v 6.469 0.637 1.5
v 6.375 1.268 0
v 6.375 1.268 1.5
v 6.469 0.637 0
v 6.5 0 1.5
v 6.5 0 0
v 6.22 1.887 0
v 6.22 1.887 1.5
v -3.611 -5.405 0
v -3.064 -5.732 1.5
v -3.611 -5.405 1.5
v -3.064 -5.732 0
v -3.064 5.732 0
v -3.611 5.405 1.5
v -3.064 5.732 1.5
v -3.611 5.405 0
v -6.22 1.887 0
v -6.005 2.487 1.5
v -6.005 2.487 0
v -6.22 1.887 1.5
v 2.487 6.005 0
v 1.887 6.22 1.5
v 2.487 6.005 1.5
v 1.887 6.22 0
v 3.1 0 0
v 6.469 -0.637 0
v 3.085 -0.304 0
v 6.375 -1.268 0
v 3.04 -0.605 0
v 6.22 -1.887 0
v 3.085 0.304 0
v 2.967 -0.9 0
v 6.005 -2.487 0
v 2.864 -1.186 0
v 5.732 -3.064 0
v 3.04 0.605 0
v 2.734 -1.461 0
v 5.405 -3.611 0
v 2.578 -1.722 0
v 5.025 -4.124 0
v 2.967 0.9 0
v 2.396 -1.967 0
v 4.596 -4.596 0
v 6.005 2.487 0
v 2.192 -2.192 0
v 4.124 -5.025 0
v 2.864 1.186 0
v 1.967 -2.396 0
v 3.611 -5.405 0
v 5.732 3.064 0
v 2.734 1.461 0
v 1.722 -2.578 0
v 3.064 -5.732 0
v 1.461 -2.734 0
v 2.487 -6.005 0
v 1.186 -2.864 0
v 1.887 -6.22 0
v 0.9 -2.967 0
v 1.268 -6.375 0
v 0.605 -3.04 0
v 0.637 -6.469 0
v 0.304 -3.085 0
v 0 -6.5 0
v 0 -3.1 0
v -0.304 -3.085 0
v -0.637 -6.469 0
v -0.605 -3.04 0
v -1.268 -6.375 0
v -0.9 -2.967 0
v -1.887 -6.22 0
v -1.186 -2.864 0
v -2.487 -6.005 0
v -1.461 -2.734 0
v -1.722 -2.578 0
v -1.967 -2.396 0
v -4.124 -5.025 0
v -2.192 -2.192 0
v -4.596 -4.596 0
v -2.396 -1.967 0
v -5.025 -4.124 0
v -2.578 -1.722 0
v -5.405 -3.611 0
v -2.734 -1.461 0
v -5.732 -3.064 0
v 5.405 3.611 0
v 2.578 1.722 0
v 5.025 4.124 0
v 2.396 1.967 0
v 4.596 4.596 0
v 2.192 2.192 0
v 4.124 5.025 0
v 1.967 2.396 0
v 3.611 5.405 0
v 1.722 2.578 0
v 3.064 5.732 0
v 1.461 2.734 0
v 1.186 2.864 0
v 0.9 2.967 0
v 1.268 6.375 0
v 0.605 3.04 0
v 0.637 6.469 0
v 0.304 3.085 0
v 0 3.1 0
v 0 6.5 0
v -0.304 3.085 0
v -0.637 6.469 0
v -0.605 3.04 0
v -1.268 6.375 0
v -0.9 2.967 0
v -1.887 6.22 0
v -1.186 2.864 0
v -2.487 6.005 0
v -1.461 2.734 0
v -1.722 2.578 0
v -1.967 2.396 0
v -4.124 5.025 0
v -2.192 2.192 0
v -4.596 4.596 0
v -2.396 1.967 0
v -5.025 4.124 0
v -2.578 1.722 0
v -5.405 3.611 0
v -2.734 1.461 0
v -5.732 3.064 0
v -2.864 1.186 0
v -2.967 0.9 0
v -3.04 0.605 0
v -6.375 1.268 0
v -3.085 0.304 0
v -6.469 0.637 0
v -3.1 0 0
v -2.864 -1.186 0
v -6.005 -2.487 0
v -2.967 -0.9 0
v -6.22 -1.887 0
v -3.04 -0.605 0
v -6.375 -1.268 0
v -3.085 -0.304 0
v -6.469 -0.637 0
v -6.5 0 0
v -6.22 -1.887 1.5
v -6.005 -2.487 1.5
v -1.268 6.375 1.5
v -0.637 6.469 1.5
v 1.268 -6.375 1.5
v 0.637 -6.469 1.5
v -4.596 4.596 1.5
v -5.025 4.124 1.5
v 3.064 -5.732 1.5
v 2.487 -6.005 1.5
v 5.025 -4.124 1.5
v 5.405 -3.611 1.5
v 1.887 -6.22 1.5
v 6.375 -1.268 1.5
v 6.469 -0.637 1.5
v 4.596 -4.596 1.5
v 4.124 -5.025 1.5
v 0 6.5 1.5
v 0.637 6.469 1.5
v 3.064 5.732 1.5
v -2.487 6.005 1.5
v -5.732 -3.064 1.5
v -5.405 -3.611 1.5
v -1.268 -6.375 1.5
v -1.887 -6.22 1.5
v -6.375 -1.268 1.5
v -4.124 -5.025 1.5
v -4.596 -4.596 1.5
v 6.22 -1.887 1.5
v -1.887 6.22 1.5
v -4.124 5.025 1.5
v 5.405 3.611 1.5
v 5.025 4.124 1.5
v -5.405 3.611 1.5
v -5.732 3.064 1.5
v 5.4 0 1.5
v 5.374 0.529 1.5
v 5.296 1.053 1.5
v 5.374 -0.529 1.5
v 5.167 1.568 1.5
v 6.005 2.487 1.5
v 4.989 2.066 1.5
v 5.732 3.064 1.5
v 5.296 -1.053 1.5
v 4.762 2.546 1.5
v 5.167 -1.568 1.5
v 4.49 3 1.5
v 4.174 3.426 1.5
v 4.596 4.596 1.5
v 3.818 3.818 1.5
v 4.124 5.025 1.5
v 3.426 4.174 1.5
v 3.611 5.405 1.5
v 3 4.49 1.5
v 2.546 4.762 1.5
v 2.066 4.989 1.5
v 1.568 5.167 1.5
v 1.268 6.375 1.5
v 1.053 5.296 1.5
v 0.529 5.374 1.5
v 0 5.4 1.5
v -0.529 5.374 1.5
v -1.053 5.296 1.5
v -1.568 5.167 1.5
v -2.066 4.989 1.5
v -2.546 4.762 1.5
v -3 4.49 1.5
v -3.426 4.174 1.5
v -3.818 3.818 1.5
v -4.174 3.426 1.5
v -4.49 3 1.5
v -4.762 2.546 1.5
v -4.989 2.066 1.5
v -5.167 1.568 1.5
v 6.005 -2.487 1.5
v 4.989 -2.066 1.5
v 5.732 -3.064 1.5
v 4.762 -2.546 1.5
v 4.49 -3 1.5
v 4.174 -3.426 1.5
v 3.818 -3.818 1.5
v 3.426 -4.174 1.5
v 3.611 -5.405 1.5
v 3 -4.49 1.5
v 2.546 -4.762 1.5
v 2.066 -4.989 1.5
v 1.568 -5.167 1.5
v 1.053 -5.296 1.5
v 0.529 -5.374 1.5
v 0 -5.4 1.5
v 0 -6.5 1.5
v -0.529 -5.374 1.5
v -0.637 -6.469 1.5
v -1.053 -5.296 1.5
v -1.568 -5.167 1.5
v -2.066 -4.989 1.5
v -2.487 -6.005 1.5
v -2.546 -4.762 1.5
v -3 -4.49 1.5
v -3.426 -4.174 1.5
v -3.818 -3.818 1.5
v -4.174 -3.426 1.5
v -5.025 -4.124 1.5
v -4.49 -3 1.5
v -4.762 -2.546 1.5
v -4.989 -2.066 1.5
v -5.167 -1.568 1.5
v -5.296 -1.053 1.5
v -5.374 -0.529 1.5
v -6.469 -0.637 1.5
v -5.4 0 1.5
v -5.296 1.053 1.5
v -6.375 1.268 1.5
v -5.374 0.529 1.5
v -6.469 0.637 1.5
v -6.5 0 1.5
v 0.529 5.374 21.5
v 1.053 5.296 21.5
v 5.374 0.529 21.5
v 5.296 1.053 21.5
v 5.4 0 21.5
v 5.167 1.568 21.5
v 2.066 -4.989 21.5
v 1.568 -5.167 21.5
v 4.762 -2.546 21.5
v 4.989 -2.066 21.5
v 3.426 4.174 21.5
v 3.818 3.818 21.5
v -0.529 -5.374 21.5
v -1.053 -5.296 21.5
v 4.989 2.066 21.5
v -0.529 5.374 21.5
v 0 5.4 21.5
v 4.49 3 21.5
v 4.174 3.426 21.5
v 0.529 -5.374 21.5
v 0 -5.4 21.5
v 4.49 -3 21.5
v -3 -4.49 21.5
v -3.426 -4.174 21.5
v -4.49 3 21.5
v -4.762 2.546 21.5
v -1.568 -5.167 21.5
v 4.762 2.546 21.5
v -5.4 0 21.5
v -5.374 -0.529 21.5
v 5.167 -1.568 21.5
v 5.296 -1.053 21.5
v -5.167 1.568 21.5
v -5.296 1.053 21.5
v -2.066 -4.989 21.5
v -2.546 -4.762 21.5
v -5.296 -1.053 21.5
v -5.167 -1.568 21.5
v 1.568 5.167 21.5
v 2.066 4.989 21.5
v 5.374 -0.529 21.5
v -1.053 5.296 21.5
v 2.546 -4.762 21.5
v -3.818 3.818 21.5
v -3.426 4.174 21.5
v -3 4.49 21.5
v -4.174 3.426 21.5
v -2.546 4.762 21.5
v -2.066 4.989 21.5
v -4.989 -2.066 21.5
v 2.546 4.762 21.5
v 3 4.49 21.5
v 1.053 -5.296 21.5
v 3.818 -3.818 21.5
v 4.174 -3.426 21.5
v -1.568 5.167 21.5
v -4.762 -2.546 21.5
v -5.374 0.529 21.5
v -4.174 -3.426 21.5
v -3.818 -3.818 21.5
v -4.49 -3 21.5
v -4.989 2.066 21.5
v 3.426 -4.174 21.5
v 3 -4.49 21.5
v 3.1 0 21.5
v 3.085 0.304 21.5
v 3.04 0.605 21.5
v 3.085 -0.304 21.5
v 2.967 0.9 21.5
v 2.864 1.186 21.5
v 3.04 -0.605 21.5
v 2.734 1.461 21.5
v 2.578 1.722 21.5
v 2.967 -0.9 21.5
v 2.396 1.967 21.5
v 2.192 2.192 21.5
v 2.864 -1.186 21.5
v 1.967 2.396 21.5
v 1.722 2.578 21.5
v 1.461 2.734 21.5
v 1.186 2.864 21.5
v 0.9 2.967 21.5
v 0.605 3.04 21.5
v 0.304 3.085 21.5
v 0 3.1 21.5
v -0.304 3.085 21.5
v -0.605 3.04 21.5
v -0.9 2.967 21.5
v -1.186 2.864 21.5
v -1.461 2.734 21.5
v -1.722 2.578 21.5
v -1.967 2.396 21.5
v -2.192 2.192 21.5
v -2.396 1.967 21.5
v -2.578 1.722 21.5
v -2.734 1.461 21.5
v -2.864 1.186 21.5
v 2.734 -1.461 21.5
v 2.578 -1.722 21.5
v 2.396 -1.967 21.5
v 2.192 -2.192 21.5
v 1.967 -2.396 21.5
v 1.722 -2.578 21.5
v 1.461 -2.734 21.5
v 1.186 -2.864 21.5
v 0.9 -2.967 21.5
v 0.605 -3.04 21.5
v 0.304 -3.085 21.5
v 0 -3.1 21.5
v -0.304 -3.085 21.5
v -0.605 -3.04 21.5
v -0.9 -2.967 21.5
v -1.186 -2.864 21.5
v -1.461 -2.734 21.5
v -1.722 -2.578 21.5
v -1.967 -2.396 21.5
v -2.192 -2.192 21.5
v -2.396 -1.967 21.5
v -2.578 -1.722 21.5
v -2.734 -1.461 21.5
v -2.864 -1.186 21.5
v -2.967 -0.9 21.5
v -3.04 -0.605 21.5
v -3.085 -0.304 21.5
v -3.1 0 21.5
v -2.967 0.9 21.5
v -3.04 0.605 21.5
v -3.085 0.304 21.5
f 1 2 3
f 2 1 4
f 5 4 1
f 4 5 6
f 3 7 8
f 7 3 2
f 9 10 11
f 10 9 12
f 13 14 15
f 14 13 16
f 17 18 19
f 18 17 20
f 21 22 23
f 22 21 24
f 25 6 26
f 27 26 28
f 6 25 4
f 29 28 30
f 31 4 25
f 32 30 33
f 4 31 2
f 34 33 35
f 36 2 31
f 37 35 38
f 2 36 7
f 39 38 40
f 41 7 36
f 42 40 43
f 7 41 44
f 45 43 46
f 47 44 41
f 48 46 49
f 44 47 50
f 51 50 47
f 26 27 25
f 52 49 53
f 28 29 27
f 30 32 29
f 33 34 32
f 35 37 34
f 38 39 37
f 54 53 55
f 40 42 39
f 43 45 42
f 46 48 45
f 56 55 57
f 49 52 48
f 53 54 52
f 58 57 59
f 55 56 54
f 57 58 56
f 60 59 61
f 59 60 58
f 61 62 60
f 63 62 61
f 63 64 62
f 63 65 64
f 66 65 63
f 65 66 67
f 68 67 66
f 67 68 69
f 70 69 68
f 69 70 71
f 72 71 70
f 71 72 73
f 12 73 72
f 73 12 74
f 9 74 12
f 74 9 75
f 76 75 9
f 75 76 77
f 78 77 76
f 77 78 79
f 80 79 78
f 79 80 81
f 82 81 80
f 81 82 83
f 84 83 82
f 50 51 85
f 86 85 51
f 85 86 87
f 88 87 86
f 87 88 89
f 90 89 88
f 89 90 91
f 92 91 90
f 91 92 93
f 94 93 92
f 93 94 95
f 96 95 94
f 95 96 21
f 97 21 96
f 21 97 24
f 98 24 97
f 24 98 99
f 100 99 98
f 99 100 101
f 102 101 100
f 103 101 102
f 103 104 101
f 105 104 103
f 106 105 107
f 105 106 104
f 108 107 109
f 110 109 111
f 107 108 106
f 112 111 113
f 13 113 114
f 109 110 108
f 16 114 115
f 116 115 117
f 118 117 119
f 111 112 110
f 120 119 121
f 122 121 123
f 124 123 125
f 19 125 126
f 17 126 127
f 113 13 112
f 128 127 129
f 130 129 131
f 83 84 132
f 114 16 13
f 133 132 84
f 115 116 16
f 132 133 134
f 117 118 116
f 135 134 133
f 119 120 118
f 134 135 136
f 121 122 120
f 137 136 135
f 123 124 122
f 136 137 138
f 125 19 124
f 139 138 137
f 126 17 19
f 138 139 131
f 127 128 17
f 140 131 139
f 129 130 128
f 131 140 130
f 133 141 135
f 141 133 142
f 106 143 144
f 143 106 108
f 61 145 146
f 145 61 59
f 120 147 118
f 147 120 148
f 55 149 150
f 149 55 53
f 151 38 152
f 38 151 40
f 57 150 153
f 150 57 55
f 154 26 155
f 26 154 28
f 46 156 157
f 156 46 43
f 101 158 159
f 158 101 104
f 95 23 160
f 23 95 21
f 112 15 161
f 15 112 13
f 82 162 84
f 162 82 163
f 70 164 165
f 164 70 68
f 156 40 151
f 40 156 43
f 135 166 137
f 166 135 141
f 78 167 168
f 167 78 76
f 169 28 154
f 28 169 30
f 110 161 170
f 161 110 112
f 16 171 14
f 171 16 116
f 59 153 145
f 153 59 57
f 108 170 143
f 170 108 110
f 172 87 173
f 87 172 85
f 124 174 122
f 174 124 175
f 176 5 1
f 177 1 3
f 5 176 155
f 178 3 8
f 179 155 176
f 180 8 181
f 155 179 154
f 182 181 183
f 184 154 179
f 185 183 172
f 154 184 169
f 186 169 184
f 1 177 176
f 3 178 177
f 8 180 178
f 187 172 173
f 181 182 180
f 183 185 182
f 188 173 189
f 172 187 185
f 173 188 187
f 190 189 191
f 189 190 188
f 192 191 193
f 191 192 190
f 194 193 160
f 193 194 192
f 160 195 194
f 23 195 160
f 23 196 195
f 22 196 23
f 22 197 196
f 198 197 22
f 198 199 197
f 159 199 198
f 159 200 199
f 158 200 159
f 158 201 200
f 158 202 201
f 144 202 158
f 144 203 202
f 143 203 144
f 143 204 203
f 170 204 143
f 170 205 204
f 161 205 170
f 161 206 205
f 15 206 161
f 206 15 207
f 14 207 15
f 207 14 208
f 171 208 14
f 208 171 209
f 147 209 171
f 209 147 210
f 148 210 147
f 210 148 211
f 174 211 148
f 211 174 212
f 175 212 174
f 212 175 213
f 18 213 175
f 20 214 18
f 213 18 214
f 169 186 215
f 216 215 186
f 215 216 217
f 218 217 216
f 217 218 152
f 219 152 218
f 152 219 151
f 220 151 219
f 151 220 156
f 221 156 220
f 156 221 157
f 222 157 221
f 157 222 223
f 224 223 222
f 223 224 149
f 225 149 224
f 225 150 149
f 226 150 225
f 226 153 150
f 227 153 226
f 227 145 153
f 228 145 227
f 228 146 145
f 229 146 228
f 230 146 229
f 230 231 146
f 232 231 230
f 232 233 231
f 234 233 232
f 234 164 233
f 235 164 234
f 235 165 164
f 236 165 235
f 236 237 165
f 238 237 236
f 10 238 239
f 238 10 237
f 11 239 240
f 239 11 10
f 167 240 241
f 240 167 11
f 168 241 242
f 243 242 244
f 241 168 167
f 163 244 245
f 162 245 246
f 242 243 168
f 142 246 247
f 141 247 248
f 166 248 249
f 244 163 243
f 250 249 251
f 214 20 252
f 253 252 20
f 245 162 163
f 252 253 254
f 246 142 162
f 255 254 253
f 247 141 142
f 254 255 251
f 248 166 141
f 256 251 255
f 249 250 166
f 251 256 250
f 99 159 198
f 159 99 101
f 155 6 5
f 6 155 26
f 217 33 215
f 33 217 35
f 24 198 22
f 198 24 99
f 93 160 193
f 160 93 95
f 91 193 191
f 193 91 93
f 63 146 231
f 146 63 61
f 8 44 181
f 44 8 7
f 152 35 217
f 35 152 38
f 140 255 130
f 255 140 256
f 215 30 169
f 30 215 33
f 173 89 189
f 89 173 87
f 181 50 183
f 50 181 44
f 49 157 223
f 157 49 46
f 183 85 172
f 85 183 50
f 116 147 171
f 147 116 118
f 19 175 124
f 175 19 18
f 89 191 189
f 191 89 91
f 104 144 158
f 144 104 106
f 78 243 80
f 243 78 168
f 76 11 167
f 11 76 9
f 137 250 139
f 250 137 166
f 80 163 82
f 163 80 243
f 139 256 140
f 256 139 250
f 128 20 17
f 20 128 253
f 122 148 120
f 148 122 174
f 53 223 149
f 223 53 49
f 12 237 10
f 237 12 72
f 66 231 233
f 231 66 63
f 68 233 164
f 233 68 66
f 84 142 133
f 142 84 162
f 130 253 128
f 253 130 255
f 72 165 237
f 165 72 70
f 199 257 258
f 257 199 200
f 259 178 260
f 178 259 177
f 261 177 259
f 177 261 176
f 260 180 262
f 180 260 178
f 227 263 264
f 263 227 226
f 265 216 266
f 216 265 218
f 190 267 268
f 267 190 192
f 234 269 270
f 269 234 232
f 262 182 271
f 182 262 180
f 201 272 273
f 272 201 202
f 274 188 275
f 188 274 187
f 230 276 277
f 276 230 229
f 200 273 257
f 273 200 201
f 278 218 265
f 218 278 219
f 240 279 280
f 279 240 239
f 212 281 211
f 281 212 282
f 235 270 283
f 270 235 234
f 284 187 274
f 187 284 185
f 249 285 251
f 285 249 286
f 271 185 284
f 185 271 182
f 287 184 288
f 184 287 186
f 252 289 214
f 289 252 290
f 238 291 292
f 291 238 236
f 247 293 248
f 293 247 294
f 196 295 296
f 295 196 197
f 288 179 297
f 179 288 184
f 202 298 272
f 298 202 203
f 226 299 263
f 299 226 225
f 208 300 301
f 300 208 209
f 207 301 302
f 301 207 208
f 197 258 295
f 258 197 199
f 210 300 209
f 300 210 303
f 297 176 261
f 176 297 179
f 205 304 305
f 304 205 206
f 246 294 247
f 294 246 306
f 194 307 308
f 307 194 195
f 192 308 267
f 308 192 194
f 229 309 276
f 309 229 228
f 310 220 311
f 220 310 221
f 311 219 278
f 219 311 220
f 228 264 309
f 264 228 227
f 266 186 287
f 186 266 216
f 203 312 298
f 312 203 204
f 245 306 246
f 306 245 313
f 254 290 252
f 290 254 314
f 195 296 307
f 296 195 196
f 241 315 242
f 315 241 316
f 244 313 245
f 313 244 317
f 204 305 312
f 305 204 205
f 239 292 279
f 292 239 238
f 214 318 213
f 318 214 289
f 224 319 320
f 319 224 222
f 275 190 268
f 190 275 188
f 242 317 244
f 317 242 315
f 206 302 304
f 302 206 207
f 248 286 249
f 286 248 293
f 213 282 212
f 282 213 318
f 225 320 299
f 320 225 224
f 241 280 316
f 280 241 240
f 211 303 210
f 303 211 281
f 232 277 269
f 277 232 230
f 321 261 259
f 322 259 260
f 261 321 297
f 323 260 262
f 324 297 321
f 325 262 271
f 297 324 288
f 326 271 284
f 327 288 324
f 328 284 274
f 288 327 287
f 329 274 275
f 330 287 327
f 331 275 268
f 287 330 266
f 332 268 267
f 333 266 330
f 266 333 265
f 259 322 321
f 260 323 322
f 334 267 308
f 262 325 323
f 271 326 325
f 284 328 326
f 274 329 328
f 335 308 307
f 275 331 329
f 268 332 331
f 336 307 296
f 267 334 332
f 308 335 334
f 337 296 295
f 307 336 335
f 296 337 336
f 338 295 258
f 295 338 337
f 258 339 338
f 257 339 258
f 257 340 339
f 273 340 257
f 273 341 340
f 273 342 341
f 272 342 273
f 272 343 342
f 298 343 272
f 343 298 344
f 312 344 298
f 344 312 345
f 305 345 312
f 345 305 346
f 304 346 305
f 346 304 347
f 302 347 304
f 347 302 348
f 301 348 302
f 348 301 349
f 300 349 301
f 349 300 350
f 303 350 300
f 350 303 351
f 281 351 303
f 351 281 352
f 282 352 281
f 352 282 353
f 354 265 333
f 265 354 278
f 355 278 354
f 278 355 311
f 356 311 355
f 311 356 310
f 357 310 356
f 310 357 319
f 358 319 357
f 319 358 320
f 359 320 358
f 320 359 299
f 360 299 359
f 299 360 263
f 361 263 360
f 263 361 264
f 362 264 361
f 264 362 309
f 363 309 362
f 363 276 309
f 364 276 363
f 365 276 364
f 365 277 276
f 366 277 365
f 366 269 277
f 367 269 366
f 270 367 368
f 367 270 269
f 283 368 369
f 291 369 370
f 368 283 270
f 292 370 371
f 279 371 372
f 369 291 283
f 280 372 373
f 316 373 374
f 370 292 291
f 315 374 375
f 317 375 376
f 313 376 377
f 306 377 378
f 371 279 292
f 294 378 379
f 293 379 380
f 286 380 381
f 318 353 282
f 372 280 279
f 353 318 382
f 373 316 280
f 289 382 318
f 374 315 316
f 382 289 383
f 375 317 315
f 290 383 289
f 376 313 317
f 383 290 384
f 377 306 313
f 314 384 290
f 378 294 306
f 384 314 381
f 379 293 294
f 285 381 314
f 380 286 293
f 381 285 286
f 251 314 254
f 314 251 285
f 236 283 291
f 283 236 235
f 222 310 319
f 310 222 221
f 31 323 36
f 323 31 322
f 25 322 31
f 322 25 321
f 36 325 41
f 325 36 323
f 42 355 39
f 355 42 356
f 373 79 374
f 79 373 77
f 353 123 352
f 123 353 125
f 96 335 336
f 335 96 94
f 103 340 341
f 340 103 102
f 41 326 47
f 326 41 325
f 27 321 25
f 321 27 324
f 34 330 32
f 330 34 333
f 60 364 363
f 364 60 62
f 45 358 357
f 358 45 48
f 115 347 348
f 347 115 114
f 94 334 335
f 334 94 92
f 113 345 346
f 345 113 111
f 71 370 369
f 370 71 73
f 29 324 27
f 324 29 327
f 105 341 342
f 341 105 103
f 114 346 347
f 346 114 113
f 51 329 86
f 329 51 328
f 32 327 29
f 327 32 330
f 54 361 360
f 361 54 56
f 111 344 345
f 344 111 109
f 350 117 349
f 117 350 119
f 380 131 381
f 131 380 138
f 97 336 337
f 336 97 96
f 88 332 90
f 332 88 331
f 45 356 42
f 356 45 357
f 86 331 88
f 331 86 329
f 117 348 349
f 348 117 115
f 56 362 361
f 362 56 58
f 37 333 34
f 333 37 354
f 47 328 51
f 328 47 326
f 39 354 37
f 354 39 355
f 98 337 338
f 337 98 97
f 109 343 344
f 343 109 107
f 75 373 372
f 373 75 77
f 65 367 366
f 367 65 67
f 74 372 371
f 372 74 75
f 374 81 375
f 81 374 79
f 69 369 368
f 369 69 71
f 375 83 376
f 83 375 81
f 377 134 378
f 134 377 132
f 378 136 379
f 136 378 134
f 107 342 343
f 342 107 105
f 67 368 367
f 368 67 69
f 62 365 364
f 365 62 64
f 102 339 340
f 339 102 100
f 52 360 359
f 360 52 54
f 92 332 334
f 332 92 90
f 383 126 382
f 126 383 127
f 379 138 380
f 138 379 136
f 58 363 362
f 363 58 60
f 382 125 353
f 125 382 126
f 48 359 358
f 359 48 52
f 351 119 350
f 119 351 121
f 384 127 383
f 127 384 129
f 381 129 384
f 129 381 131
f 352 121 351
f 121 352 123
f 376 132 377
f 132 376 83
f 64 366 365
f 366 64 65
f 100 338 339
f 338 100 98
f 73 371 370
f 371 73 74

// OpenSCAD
// PCR Tube Adapter Sleeve - fits a 0.2 mL tube into a 1.5 mL rack hole.
// Print orientation: Collar on bed (z=0 to 1.5), body rises to z=21.5.

// Dimensions
collar_od   = 13;      // Outer diameter of the collar
collar_t    = 1.5;     // Thickness of the collar
body_od     = 10.8;    // Outer diameter of the sleeve body
target_z_top = 21.5;   // Top of the sleeve body (absolute Z)
bore_d      = 6.2;     // Diameter of the straight bore

// Derived dimensions
collar_z_top = collar_t;
body_height  = target_z_top - collar_z_top; // 21.5 - 1.5 = 20.0
total_height = target_z_top;

// Overcuts for clean printing (Rule 5)
overcut = 0.1;

$fn = 64;

difference() {
    union() {
        // 1. The Collar (lies on the bed)
        translate([0, 0, 0]) 
            cylinder(h = collar_t, d = collar_od);

        // 2. The Sleeve Body (rises from the collar to target_z_top)
        translate([0, 0, collar_z_top]) 
            cylinder(h = body_height, d = body_od);
    }

    // 3. The Bore (straight hole through the full height)
    // Extends slightly past top and bottom to ensure it is open
    translate([0, 0, -overcut]) 
        cylinder(h = total_height + 2 * overcut, d = bore_d);
}
